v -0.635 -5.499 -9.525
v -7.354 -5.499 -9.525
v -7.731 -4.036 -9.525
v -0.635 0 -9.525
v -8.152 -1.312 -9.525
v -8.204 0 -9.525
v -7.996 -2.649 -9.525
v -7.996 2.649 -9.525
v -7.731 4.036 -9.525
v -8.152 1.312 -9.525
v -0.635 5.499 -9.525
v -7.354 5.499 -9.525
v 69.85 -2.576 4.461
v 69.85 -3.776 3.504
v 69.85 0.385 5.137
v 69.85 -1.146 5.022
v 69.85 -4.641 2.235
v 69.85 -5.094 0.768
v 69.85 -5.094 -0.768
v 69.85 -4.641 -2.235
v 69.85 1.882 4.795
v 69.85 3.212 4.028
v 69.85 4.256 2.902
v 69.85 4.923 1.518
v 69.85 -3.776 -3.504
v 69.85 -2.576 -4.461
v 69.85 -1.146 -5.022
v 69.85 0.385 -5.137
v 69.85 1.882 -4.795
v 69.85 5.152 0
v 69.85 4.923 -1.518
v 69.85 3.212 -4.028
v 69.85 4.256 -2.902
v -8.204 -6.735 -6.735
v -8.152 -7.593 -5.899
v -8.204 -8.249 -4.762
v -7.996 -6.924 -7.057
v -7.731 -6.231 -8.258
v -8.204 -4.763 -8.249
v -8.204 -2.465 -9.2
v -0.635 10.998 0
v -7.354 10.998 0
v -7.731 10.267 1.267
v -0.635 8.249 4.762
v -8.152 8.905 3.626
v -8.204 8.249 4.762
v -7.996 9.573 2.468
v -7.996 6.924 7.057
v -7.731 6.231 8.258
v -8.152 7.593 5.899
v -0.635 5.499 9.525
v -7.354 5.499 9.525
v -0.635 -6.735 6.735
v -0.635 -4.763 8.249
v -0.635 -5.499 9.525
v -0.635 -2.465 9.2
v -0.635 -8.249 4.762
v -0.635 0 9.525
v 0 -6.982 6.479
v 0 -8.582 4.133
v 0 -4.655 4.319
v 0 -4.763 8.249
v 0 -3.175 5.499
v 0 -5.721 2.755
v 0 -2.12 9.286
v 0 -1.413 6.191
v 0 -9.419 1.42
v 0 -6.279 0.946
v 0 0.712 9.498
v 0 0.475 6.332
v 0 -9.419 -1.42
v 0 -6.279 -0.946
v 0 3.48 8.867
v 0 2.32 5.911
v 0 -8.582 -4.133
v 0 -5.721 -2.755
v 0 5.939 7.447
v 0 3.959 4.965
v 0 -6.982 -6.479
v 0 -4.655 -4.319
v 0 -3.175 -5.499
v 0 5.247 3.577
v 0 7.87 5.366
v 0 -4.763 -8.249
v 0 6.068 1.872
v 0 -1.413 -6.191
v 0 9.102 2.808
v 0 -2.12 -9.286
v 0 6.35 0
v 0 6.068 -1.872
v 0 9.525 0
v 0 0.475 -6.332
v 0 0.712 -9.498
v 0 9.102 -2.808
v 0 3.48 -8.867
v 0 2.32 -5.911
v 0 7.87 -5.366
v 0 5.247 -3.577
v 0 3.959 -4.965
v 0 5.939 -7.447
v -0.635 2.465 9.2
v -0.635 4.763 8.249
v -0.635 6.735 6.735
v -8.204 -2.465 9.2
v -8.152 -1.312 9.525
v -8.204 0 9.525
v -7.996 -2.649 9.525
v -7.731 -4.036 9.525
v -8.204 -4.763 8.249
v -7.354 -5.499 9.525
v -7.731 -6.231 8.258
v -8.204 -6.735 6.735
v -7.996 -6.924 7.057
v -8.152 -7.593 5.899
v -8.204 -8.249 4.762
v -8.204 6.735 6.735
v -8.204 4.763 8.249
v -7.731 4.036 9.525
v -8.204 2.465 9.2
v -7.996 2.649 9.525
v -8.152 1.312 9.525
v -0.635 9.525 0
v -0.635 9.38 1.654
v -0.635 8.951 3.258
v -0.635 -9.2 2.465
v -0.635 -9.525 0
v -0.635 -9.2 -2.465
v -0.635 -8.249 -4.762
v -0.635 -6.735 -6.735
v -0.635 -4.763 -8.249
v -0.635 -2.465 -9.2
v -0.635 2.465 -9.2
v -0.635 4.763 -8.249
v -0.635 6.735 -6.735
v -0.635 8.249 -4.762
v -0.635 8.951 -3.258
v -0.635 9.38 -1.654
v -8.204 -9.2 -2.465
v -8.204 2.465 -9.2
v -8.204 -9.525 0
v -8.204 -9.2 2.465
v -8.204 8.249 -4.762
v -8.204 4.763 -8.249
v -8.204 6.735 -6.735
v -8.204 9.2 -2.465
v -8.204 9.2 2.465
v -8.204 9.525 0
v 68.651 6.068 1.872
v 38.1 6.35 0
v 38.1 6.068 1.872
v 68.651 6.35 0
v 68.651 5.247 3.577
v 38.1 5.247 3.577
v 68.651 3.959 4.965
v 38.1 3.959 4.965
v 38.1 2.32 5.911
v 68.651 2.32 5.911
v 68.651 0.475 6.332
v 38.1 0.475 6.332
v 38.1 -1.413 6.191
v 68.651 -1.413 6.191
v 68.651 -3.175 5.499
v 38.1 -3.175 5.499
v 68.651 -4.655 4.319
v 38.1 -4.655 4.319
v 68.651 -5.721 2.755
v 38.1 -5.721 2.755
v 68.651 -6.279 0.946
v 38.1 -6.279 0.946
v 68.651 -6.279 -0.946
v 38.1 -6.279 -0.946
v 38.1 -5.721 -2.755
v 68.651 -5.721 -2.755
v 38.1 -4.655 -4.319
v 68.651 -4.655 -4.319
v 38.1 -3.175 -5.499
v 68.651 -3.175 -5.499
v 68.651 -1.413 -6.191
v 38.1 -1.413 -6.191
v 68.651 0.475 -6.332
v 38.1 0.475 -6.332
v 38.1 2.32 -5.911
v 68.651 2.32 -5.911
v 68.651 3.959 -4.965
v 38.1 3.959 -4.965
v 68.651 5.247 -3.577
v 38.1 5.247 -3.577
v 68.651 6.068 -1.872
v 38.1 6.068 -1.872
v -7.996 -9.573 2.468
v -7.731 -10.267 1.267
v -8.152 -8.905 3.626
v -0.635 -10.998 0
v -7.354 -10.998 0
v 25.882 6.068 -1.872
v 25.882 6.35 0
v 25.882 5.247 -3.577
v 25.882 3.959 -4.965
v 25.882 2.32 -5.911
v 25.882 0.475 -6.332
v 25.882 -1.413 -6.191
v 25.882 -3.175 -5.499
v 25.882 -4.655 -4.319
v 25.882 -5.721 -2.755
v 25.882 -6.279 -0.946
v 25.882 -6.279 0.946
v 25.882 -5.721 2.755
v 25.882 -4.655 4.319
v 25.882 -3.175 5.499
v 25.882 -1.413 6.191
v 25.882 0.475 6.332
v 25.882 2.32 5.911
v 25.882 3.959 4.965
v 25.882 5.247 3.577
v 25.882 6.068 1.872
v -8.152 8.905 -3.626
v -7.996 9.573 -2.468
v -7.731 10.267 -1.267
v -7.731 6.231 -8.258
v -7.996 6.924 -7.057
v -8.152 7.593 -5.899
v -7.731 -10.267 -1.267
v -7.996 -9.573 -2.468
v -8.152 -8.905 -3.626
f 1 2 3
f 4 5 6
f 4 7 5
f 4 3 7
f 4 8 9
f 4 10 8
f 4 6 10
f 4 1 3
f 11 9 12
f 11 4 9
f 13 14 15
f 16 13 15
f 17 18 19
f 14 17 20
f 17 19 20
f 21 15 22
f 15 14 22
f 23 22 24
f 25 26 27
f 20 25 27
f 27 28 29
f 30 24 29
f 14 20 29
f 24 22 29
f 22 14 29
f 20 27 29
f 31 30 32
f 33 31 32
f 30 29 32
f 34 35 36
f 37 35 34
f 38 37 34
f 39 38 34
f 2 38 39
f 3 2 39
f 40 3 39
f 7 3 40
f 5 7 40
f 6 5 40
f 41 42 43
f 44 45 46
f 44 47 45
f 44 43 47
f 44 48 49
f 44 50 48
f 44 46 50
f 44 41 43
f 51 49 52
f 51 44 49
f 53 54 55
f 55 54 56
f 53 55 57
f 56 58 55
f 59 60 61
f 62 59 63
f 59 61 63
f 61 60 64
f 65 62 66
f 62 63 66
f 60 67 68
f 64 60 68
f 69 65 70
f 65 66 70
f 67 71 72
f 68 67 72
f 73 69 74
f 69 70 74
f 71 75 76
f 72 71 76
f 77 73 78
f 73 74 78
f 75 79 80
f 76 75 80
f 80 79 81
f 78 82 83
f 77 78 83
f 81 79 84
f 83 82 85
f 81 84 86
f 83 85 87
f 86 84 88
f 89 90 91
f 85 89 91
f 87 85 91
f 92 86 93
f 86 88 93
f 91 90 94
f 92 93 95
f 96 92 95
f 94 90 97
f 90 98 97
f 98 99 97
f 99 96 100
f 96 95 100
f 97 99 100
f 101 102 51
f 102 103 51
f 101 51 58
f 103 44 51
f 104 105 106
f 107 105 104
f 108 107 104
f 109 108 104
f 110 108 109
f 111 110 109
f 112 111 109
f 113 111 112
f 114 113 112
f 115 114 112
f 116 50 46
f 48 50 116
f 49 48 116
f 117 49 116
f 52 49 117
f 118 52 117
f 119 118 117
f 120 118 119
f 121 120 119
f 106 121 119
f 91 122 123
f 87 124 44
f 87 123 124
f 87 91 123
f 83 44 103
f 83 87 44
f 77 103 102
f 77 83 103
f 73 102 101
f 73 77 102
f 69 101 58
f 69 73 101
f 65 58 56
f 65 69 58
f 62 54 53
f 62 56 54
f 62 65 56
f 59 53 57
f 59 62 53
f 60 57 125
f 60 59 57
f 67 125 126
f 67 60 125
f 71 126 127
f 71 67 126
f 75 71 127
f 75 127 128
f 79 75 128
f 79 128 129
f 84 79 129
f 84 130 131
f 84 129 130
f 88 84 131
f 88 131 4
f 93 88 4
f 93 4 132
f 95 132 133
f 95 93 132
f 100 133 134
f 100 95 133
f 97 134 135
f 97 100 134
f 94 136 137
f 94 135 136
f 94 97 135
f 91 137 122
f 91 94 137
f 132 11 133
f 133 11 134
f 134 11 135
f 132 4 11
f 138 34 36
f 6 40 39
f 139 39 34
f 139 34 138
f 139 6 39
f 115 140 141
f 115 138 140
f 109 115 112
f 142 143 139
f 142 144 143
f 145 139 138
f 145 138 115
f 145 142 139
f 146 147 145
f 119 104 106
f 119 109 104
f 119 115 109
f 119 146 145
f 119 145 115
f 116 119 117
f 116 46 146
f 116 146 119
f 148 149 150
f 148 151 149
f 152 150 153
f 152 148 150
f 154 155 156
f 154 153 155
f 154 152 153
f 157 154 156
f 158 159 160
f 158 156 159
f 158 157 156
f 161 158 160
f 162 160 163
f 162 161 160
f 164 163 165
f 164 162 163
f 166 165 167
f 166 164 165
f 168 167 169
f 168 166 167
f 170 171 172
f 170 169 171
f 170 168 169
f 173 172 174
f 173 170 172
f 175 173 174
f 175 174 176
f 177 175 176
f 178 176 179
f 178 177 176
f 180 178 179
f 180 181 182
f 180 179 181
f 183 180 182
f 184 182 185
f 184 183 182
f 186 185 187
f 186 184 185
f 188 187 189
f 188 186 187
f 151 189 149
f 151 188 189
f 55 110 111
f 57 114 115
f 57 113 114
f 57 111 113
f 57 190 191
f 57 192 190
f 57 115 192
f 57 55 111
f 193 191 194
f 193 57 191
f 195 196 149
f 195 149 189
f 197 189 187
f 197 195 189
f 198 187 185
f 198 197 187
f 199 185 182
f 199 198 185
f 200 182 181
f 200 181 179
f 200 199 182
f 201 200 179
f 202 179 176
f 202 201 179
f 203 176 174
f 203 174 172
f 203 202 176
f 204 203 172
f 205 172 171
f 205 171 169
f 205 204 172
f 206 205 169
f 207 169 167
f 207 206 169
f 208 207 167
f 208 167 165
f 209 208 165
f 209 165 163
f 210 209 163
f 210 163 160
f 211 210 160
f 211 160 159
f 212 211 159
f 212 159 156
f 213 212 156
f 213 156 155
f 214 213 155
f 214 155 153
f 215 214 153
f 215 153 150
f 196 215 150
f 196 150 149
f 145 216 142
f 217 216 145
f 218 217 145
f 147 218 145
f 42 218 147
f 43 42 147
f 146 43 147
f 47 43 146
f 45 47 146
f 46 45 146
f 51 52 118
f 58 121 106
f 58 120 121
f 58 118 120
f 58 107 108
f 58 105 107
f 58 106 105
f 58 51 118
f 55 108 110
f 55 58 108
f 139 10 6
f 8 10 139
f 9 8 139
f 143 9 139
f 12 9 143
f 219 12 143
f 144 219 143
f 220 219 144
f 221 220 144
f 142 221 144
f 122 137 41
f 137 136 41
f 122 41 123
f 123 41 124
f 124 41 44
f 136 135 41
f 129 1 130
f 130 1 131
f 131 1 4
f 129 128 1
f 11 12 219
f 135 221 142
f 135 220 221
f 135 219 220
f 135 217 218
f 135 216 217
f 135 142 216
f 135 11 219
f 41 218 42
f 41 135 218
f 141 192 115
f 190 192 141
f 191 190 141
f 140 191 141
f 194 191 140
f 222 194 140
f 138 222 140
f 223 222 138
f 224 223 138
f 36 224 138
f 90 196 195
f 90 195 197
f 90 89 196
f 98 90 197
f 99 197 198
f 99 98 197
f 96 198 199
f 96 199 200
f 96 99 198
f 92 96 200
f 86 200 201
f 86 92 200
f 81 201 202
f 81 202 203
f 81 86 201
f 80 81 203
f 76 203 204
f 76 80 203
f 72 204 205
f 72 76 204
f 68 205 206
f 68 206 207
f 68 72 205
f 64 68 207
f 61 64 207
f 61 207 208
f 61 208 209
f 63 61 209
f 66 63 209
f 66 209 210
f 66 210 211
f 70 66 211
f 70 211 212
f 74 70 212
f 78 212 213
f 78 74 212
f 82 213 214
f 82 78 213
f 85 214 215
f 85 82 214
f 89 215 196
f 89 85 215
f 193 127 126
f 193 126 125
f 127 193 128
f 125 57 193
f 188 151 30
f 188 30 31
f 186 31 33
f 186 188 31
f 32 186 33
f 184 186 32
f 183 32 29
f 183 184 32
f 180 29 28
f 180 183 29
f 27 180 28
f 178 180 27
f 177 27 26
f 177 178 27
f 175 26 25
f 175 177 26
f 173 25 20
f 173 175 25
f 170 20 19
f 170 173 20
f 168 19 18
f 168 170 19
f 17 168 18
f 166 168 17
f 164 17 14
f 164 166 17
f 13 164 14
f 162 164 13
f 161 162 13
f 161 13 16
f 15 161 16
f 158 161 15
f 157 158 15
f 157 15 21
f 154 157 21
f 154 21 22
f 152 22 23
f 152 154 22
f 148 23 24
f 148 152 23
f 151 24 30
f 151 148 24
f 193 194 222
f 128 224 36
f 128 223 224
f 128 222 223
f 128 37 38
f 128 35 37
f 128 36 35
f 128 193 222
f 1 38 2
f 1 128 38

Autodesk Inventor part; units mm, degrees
ref_plane "YZ Plane" through (0, 0, 0) normal (1, 0, 0) x (0, 1, 0)
ref_plane "XZ Plane" through (0, 0, 0) normal (0, 1, 0) x (-1, 0, 0)
sketch "Sketch1" plane through (0, 0, 0) normal (0, 0, 1) x (1, 0, 0)
  line L0 (0, 9.525) -> (0, 6.35)
  line L1 (38.1, 6.35) -> (69.85, 6.35)
  line L2 (69.85, 6.35) -> (69.85, 0)
  line L3 (69.85, 0) -> (-0.6351, 0)
  line L4 (-14.7321, 0) -> (83.947, 0) projected
  line L5 (-0.6351, 0) -> (-0.6351, 9.525)
  line L6 (-0.6351, 9.525) -> (0, 9.525)
  line L7 (38.1, 6.35) -> (25.8825, 6.35)
  line L8 (25.8825, 6.35) -> (0, 6.35)
  line L9 (0, -1.905) -> (0, 11.43) projected
  dimension "d0" = 69.85
  dimension "d1" = 31.75
  dimension "d2" = 12.7
  dimension "d9" = 0.6351
  dimension "d10" = 19.05
  dimension "d13" = 12.2175
  dimension "d14" = 12.7
revolve "Body" add sketch "Sketch1" angle 360 about axis through (69.85, 0, 0) along (-1, 0, 0)
sketch "Sketch2" plane through (-0.6351, 0, 0) normal (-1, 0, 0) x (0, 0, 1)
  line L0 (0, 10.9985) -> (9.525, 5.4993)
  line L1 (9.525, 5.4993) -> (9.525, -5.4993)
  line L2 (9.525, -5.4993) -> (0, -10.9985)
  line L3 (0, -10.9985) -> (-9.525, -5.4993)
  line L4 (-9.525, -5.4993) -> (-9.525, 5.4993)
  line L5 (-9.525, 5.4993) -> (0, 10.9985)
  point P0 (0, 0)
  point P1 (0, 0)
  dimension "d11" = 19.05
extrude "Head" add sketch "Sketch2" along normal blind 7.5692
sketch "Sketch4" plane through (0, 0, 0) normal (0, 0, 1) x (1, 0, 0)
  line L0 (-8.2043, 9.525) -> (-8.2043, 10.9985)
  line L1 (-8.2043, 10.9985) -> (-7.3536, 10.9985)
  line L2 (-7.3536, 10.9985) -> (-8.2043, 9.525)
  line L3 (-9.7181, 0) -> (0.8787, 0) projected
  line L4 (-0.6351, 10.9985) -> (-8.2043, 10.9985) projected
  line L5 (-8.2043, 5.4993) -> (-8.2043, 10.9985) projected
  dimension "d5" = 30
  dimension "d19" = 19.05
revolve "Chamfer1" cut sketch "Sketch4" angle 360 about axis through (-10, 0, 0) along (1, 0, 0)
thread "Thread" size "1/2-13 UNC" class "2A" standard "ANSI Unified Screw Threads" length 31.75
chamfer "Chamfer2" distance 1.1985 distance2 1.1987 1 edges at (69.85, -6.35, 0) measured on face at (69.85, 1.2024, 1.742)
ref_plane "Work Plane1" through (1.525, 0, 0) normal (0, 0, 1) x (1, 0, 0)
equation "\"d0\" = NLG"
equation "\"d1\" = GEL"
equation "\"d2\" = GD"
equation "\"d10\" = SD2"
equation "\"d14\" = BDM"
equation "\"d11\" = SW"
equation "\"d3\" = KOH - SD"
equation "\"d5\" = ANG1"
equation "\"d19\" = SW0"
equation "\"d15\" = GEL"
equation "\"d6\" = -0.5 * SPD + 0.5 * GD"
equation "\"NLG\" = 69.85"
equation "\"GD\" = 12.7"
equation "\"BDM\" = 12.7"
equation "\"KOH\" = 8.2042"
equation "\"GEL\" = 31.75"
equation "\"SW\" = 19.05"
equation "\"SW0\" = SW"
equation "\"SPD\" = GD1"
equation "\"SD2\" = SW"
equation "\"SD\" = 0.635"
equation "\"ANG1\" = 30deg"
equation "\"GAL\" = 12.2174"
equation "\"GUL\" = 1.19863"
equation "\"RR\" = 0.381"
equation "\"WFT\" = SD"
equation "\"GD1\" = 10.303"
equation "\"THREADDIA\" = 12.7"
equation "\"SDH\" = SW"
equation "\"SDHG\" = 25.8826"
equation "\"TOA\" = 30deg"
equation "\"FAWI\" = 45deg"
equation "\"NND\" = 12.7"
equation "\"E0\" = 22.00275"
properties part number "AS 2465 - 1/2 x 2 3/4  UNC" material "Steel, Mild"
